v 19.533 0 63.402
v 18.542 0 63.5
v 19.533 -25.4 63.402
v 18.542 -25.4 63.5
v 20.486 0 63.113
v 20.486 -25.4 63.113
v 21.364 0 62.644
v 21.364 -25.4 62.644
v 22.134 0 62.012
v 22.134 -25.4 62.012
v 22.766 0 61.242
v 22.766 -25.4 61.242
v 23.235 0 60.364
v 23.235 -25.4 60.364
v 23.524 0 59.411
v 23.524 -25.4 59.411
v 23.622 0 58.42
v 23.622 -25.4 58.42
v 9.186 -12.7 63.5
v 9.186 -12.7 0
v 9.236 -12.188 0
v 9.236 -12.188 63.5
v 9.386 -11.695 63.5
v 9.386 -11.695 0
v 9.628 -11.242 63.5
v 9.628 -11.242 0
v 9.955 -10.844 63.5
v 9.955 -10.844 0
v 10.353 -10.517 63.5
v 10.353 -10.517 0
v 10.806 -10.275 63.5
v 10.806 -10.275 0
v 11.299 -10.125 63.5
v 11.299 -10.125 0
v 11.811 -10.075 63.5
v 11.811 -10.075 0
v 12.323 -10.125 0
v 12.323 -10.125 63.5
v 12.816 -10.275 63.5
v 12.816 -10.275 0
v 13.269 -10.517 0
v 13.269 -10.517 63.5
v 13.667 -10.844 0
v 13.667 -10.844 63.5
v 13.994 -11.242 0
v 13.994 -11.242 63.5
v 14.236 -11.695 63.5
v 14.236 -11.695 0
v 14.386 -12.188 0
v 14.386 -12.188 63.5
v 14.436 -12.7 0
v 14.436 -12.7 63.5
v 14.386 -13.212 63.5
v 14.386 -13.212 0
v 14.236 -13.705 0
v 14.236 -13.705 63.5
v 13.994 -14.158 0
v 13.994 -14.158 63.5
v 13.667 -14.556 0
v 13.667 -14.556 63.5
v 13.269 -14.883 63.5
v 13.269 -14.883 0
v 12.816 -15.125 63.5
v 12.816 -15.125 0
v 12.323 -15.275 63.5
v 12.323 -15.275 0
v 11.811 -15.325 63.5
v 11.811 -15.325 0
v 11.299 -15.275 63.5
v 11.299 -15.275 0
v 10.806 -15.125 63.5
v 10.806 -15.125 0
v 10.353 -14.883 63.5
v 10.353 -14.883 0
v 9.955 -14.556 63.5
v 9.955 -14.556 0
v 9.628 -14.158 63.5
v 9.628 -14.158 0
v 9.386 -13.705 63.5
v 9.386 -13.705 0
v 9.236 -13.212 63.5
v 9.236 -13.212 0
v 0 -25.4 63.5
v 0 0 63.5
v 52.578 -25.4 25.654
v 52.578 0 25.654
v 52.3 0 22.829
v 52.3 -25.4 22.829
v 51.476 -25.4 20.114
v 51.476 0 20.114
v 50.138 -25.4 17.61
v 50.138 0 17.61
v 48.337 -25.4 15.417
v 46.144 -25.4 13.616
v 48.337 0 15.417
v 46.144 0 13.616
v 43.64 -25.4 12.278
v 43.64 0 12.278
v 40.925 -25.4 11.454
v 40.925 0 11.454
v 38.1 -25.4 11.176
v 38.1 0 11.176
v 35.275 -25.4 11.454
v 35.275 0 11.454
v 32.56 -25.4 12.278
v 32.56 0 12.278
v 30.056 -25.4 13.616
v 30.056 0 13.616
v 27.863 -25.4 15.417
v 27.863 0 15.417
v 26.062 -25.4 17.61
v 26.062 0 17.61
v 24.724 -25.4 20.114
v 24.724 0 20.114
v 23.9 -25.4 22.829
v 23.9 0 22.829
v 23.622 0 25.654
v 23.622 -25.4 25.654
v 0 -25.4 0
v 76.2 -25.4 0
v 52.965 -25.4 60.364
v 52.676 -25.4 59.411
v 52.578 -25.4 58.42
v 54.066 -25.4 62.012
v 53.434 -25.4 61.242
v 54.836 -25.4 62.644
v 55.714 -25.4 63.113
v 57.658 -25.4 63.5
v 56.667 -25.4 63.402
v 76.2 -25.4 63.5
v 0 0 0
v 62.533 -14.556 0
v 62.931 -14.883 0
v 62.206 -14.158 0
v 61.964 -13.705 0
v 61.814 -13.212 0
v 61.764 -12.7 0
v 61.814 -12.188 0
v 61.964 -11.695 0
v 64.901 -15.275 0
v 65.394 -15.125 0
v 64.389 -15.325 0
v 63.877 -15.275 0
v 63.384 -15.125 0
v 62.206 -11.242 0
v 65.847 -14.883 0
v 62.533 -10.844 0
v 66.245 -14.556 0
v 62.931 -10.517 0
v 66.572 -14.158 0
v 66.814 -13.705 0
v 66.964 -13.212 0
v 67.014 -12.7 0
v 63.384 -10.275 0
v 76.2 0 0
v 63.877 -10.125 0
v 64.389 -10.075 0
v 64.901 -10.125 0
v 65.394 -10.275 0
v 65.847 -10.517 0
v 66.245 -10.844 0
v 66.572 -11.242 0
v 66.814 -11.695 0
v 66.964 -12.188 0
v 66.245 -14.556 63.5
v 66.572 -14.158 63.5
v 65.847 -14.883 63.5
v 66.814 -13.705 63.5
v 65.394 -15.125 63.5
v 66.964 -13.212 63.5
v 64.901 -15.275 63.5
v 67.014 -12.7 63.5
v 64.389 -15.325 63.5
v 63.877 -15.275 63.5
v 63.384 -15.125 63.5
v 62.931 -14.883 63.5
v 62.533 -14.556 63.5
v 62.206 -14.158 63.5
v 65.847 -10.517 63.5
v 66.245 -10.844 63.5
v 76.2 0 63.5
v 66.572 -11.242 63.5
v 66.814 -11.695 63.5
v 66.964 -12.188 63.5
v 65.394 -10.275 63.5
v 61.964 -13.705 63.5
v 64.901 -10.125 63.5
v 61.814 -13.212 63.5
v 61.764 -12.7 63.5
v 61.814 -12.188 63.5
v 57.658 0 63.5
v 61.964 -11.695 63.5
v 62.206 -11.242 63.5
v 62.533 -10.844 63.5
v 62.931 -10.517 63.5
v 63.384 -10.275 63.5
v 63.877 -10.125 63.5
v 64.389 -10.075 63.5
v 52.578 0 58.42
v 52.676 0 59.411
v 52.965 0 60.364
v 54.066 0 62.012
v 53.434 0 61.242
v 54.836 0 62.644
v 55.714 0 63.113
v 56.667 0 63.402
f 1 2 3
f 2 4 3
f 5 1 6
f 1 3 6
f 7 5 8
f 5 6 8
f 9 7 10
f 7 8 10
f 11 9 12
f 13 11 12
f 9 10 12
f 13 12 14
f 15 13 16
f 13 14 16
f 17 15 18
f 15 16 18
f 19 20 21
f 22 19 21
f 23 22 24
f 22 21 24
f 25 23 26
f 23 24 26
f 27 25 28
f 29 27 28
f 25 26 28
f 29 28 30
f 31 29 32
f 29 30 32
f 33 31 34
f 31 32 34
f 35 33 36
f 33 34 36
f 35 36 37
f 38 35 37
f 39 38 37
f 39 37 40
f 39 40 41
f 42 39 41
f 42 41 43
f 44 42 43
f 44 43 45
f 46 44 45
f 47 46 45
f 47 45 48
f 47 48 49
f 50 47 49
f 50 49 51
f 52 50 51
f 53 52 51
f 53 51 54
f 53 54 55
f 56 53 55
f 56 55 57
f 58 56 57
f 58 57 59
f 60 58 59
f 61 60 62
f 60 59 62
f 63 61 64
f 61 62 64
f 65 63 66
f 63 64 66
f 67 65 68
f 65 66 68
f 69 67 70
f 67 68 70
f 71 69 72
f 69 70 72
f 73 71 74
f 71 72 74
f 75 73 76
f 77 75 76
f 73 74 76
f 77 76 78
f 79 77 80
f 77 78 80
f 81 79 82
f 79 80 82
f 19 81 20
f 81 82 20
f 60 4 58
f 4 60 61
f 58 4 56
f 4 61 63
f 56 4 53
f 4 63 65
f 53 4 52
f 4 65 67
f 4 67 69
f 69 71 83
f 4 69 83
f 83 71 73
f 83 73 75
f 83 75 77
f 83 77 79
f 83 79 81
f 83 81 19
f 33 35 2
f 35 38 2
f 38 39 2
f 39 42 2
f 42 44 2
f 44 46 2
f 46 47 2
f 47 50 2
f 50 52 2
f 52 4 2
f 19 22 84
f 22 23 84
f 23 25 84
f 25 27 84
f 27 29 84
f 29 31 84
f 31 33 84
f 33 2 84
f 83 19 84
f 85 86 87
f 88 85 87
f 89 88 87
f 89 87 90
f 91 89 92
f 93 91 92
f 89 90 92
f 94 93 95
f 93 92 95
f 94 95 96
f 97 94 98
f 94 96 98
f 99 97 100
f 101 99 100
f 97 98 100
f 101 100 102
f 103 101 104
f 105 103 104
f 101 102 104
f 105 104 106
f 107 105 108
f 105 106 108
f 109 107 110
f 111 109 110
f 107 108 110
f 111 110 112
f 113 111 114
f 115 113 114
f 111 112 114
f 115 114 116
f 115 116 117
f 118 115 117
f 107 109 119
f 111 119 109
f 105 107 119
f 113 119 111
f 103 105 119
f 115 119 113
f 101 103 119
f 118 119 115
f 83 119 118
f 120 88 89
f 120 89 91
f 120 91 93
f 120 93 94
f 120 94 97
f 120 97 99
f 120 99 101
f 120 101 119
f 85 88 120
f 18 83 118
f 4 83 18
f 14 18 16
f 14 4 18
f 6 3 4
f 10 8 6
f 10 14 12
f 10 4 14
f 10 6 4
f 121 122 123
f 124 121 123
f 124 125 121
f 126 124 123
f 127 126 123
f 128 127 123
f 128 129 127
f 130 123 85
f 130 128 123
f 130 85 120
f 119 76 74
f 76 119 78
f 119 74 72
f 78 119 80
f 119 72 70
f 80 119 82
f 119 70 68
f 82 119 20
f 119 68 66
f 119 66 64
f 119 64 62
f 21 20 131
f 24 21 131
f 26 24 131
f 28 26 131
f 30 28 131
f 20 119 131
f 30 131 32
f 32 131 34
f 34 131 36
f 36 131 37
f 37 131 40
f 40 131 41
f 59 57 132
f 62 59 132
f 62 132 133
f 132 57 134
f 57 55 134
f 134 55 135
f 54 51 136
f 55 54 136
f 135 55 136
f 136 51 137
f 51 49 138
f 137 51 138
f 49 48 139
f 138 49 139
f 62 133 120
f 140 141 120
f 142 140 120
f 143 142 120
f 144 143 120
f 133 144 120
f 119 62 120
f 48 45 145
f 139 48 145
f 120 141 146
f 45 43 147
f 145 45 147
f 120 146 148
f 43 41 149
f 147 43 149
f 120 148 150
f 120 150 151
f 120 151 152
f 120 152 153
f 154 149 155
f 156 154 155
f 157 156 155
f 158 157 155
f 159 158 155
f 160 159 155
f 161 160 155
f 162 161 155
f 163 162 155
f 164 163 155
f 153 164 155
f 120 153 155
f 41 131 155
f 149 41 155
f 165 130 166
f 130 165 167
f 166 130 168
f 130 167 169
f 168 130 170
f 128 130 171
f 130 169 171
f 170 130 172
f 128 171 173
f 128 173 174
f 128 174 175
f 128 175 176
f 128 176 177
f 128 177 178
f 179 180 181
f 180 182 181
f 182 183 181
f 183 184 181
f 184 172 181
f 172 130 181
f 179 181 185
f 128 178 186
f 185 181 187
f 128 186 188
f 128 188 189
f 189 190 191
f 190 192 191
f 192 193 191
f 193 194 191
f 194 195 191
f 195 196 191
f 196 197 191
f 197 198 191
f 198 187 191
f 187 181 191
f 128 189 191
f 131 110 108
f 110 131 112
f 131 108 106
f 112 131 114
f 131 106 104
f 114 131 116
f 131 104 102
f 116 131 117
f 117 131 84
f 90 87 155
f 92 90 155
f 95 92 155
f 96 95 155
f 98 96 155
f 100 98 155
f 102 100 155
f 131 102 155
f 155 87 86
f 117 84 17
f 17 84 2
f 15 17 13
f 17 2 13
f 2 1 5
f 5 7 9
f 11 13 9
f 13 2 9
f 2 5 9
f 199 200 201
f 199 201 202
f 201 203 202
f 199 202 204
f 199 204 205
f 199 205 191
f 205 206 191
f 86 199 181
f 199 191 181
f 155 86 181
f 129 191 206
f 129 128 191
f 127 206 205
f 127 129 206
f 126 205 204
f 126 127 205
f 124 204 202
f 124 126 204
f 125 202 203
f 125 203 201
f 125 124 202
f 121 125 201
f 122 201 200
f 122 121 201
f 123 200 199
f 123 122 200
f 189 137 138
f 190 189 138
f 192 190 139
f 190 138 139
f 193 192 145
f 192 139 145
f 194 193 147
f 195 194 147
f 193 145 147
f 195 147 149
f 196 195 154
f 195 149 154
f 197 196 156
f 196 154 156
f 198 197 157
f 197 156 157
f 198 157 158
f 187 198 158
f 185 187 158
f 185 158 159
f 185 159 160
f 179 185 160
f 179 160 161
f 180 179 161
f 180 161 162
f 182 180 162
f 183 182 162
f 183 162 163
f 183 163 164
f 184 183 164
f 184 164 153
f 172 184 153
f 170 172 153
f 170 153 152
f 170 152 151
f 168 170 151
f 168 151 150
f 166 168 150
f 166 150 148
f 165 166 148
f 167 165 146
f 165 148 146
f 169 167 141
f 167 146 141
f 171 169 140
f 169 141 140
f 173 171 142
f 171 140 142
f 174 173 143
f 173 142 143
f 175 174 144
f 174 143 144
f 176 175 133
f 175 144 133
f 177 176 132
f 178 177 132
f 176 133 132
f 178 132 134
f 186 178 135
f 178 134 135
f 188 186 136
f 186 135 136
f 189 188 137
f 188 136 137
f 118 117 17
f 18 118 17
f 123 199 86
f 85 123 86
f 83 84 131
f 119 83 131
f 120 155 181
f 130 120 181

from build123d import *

# Parameters (mm, degrees)
F1_DEPTH   = 25.4
F4_D       = 5.25
F4_ON_F3_D = 5.25
F5_R       = 5.08


with BuildPart() as f1:
    # F0 (on Front) → F1 (new body)
    with BuildSketch(Plane.XZ):
        with BuildLine():
            Line((0, 63.5), (0, 0))
            Line((0, 0), (76.2, 0))
            Line((76.2, 0), (76.2, 63.5))
            Line((76.2, 63.5), (52.578, 63.5))
            Line((52.578, 63.5), (52.578, 25.654))
            ThreePointArc((52.578, 25.654), (38.1, 11.176), (23.622, 25.654))
            Line((23.622, 25.654), (23.622, 63.5))
            Line((23.622, 63.5), (0, 63.5))
        make_face()
    extrude(amount=F1_DEPTH)

    # F4 (through all)
    with Locations(Plane.XY.offset(63.5)):
        with Locations((11.811, -12.7)):
            Hole(F4_D / 2)

    # F4 on F3 (through all)
    with Locations(Plane.XY.offset(63.5)):
        with Locations((64.389, -12.7)):
            Hole(F4_ON_F3_D / 2)

    # F5
    f5_edges = [f1.edges().sort_by_distance(p)[0] for p in [
        (23.622, -12.7, 63.5),
        (52.578, -12.7, 63.5),
    ]]
    fillet(f5_edges, radius=F5_R)


solid = f1.part
